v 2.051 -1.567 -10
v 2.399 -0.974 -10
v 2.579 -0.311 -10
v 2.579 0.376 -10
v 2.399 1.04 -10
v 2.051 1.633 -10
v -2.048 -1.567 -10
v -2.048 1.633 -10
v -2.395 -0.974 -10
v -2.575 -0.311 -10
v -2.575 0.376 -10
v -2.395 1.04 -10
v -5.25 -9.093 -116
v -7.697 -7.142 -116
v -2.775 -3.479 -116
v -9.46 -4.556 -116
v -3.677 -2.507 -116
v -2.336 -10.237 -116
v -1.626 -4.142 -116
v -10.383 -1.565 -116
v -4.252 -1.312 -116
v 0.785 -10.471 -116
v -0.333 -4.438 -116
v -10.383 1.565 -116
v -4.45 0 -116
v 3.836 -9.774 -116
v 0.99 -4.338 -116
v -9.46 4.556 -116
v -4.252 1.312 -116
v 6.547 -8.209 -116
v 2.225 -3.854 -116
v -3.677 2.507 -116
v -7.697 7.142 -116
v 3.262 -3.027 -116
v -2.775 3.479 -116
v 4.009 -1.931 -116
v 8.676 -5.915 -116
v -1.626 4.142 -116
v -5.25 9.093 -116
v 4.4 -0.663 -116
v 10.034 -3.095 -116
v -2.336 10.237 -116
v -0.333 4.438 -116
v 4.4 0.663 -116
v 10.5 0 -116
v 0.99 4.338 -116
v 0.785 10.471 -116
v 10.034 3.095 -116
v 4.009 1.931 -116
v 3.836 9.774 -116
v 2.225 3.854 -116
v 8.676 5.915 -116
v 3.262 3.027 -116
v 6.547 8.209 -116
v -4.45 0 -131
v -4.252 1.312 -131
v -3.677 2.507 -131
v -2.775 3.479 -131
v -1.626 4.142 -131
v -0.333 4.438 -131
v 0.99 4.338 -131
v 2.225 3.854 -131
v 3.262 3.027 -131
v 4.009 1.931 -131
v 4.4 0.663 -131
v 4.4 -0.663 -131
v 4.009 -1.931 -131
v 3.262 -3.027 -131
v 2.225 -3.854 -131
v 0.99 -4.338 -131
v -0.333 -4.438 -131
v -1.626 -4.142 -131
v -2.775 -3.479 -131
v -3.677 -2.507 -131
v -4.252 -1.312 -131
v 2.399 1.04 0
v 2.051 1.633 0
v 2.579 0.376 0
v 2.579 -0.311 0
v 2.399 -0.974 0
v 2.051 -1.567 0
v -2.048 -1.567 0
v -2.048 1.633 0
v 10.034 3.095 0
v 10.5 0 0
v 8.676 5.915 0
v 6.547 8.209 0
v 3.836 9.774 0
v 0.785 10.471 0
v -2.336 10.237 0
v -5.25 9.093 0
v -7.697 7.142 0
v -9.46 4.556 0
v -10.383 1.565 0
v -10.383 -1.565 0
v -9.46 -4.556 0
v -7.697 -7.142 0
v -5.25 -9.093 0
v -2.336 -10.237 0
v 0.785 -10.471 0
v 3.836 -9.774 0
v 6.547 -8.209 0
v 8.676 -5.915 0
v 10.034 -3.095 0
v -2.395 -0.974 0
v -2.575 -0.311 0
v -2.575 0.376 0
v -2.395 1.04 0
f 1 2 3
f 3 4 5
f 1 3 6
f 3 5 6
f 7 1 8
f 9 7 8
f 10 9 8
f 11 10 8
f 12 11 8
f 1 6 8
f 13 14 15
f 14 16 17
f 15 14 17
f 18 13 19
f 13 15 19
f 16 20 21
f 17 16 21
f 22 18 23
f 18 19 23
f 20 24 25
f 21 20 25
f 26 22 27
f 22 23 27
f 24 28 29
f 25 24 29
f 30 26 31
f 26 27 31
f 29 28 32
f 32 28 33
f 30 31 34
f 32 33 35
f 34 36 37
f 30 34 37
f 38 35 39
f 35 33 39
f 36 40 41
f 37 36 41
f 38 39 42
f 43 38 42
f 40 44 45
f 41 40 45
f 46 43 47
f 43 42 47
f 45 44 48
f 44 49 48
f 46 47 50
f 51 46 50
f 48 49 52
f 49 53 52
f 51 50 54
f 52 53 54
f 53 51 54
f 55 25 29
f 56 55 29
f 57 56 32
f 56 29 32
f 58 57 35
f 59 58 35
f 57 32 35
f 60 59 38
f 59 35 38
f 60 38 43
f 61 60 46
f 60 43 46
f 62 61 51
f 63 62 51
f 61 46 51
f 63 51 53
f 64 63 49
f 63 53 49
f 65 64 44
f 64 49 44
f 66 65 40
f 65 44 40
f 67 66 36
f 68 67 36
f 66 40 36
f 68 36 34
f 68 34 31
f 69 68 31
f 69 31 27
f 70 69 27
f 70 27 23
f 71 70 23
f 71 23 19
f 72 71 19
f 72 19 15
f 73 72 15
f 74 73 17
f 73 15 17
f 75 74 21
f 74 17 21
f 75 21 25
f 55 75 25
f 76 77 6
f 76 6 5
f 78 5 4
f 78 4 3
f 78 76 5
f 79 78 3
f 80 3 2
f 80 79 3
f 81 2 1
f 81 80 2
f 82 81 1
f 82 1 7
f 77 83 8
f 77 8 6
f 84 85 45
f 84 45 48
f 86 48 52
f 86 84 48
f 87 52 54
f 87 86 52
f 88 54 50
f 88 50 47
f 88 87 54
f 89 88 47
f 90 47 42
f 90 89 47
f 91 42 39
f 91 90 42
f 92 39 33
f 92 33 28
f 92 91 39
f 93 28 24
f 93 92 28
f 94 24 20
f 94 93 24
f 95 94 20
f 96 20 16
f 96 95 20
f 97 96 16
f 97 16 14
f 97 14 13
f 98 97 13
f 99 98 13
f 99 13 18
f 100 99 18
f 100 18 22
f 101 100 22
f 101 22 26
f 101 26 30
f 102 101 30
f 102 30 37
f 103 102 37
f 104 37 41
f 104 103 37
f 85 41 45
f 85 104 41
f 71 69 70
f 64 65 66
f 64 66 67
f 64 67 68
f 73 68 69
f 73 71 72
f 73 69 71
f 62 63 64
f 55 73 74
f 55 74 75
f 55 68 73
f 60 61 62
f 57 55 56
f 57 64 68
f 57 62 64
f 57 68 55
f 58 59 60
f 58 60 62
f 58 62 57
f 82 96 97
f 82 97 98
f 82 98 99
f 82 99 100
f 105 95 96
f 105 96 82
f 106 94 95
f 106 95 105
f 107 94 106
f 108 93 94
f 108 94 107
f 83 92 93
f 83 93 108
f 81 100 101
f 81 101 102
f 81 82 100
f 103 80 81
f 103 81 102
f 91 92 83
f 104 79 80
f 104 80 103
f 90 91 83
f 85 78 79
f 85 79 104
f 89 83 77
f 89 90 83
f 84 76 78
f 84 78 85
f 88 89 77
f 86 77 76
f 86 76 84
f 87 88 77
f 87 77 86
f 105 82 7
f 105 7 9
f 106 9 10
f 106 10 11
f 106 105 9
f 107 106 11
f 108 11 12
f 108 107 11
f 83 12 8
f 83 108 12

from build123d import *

# Parameters (mm, degrees)
SKETCH2_R           = 10.5
BOSS_EXTRUDE1_DEPTH = 116
SKETCH3_R           = 4.45
BOSS_EXTRUDE2_DEPTH = 15
CUT_EXTRUDE1_DEPTH  = 10


with BuildPart() as part:
    # Sketch2 → Boss-Extrude1 (new body)
    with BuildSketch(Plane.XY):
        Circle(SKETCH2_R)
    extrude(amount=-BOSS_EXTRUDE1_DEPTH)

    # Sketch3 → Boss-Extrude2 (add)
    with BuildSketch(Plane(origin=(0, 0, -116), x_dir=(-1, 0, 0), z_dir=(0, 0, -1))):
        Circle(SKETCH3_R)
    extrude(amount=BOSS_EXTRUDE2_DEPTH)

    # Sketch1 → Cut-Extrude1 (cut)
    with BuildSketch(Plane.XY):
        with BuildLine():
            Line((2.051104302, -1.567413373), (-2.047676004, -1.567413373))
            ThreePointArc((-2.047676004, -1.567413373), (-2.598285851, 0.032586627), (-2.047676004, 1.632586627))
            Line((-2.047676004, 1.632586627), (2.051104302, 1.632586627))
            ThreePointArc((2.051104302, 1.632586627), (2.601714149, 0.032586627), (2.051104302, -1.567413373))
        make_face()
    extrude(amount=-CUT_EXTRUDE1_DEPTH, mode=Mode.SUBTRACT)


solid = part.part
